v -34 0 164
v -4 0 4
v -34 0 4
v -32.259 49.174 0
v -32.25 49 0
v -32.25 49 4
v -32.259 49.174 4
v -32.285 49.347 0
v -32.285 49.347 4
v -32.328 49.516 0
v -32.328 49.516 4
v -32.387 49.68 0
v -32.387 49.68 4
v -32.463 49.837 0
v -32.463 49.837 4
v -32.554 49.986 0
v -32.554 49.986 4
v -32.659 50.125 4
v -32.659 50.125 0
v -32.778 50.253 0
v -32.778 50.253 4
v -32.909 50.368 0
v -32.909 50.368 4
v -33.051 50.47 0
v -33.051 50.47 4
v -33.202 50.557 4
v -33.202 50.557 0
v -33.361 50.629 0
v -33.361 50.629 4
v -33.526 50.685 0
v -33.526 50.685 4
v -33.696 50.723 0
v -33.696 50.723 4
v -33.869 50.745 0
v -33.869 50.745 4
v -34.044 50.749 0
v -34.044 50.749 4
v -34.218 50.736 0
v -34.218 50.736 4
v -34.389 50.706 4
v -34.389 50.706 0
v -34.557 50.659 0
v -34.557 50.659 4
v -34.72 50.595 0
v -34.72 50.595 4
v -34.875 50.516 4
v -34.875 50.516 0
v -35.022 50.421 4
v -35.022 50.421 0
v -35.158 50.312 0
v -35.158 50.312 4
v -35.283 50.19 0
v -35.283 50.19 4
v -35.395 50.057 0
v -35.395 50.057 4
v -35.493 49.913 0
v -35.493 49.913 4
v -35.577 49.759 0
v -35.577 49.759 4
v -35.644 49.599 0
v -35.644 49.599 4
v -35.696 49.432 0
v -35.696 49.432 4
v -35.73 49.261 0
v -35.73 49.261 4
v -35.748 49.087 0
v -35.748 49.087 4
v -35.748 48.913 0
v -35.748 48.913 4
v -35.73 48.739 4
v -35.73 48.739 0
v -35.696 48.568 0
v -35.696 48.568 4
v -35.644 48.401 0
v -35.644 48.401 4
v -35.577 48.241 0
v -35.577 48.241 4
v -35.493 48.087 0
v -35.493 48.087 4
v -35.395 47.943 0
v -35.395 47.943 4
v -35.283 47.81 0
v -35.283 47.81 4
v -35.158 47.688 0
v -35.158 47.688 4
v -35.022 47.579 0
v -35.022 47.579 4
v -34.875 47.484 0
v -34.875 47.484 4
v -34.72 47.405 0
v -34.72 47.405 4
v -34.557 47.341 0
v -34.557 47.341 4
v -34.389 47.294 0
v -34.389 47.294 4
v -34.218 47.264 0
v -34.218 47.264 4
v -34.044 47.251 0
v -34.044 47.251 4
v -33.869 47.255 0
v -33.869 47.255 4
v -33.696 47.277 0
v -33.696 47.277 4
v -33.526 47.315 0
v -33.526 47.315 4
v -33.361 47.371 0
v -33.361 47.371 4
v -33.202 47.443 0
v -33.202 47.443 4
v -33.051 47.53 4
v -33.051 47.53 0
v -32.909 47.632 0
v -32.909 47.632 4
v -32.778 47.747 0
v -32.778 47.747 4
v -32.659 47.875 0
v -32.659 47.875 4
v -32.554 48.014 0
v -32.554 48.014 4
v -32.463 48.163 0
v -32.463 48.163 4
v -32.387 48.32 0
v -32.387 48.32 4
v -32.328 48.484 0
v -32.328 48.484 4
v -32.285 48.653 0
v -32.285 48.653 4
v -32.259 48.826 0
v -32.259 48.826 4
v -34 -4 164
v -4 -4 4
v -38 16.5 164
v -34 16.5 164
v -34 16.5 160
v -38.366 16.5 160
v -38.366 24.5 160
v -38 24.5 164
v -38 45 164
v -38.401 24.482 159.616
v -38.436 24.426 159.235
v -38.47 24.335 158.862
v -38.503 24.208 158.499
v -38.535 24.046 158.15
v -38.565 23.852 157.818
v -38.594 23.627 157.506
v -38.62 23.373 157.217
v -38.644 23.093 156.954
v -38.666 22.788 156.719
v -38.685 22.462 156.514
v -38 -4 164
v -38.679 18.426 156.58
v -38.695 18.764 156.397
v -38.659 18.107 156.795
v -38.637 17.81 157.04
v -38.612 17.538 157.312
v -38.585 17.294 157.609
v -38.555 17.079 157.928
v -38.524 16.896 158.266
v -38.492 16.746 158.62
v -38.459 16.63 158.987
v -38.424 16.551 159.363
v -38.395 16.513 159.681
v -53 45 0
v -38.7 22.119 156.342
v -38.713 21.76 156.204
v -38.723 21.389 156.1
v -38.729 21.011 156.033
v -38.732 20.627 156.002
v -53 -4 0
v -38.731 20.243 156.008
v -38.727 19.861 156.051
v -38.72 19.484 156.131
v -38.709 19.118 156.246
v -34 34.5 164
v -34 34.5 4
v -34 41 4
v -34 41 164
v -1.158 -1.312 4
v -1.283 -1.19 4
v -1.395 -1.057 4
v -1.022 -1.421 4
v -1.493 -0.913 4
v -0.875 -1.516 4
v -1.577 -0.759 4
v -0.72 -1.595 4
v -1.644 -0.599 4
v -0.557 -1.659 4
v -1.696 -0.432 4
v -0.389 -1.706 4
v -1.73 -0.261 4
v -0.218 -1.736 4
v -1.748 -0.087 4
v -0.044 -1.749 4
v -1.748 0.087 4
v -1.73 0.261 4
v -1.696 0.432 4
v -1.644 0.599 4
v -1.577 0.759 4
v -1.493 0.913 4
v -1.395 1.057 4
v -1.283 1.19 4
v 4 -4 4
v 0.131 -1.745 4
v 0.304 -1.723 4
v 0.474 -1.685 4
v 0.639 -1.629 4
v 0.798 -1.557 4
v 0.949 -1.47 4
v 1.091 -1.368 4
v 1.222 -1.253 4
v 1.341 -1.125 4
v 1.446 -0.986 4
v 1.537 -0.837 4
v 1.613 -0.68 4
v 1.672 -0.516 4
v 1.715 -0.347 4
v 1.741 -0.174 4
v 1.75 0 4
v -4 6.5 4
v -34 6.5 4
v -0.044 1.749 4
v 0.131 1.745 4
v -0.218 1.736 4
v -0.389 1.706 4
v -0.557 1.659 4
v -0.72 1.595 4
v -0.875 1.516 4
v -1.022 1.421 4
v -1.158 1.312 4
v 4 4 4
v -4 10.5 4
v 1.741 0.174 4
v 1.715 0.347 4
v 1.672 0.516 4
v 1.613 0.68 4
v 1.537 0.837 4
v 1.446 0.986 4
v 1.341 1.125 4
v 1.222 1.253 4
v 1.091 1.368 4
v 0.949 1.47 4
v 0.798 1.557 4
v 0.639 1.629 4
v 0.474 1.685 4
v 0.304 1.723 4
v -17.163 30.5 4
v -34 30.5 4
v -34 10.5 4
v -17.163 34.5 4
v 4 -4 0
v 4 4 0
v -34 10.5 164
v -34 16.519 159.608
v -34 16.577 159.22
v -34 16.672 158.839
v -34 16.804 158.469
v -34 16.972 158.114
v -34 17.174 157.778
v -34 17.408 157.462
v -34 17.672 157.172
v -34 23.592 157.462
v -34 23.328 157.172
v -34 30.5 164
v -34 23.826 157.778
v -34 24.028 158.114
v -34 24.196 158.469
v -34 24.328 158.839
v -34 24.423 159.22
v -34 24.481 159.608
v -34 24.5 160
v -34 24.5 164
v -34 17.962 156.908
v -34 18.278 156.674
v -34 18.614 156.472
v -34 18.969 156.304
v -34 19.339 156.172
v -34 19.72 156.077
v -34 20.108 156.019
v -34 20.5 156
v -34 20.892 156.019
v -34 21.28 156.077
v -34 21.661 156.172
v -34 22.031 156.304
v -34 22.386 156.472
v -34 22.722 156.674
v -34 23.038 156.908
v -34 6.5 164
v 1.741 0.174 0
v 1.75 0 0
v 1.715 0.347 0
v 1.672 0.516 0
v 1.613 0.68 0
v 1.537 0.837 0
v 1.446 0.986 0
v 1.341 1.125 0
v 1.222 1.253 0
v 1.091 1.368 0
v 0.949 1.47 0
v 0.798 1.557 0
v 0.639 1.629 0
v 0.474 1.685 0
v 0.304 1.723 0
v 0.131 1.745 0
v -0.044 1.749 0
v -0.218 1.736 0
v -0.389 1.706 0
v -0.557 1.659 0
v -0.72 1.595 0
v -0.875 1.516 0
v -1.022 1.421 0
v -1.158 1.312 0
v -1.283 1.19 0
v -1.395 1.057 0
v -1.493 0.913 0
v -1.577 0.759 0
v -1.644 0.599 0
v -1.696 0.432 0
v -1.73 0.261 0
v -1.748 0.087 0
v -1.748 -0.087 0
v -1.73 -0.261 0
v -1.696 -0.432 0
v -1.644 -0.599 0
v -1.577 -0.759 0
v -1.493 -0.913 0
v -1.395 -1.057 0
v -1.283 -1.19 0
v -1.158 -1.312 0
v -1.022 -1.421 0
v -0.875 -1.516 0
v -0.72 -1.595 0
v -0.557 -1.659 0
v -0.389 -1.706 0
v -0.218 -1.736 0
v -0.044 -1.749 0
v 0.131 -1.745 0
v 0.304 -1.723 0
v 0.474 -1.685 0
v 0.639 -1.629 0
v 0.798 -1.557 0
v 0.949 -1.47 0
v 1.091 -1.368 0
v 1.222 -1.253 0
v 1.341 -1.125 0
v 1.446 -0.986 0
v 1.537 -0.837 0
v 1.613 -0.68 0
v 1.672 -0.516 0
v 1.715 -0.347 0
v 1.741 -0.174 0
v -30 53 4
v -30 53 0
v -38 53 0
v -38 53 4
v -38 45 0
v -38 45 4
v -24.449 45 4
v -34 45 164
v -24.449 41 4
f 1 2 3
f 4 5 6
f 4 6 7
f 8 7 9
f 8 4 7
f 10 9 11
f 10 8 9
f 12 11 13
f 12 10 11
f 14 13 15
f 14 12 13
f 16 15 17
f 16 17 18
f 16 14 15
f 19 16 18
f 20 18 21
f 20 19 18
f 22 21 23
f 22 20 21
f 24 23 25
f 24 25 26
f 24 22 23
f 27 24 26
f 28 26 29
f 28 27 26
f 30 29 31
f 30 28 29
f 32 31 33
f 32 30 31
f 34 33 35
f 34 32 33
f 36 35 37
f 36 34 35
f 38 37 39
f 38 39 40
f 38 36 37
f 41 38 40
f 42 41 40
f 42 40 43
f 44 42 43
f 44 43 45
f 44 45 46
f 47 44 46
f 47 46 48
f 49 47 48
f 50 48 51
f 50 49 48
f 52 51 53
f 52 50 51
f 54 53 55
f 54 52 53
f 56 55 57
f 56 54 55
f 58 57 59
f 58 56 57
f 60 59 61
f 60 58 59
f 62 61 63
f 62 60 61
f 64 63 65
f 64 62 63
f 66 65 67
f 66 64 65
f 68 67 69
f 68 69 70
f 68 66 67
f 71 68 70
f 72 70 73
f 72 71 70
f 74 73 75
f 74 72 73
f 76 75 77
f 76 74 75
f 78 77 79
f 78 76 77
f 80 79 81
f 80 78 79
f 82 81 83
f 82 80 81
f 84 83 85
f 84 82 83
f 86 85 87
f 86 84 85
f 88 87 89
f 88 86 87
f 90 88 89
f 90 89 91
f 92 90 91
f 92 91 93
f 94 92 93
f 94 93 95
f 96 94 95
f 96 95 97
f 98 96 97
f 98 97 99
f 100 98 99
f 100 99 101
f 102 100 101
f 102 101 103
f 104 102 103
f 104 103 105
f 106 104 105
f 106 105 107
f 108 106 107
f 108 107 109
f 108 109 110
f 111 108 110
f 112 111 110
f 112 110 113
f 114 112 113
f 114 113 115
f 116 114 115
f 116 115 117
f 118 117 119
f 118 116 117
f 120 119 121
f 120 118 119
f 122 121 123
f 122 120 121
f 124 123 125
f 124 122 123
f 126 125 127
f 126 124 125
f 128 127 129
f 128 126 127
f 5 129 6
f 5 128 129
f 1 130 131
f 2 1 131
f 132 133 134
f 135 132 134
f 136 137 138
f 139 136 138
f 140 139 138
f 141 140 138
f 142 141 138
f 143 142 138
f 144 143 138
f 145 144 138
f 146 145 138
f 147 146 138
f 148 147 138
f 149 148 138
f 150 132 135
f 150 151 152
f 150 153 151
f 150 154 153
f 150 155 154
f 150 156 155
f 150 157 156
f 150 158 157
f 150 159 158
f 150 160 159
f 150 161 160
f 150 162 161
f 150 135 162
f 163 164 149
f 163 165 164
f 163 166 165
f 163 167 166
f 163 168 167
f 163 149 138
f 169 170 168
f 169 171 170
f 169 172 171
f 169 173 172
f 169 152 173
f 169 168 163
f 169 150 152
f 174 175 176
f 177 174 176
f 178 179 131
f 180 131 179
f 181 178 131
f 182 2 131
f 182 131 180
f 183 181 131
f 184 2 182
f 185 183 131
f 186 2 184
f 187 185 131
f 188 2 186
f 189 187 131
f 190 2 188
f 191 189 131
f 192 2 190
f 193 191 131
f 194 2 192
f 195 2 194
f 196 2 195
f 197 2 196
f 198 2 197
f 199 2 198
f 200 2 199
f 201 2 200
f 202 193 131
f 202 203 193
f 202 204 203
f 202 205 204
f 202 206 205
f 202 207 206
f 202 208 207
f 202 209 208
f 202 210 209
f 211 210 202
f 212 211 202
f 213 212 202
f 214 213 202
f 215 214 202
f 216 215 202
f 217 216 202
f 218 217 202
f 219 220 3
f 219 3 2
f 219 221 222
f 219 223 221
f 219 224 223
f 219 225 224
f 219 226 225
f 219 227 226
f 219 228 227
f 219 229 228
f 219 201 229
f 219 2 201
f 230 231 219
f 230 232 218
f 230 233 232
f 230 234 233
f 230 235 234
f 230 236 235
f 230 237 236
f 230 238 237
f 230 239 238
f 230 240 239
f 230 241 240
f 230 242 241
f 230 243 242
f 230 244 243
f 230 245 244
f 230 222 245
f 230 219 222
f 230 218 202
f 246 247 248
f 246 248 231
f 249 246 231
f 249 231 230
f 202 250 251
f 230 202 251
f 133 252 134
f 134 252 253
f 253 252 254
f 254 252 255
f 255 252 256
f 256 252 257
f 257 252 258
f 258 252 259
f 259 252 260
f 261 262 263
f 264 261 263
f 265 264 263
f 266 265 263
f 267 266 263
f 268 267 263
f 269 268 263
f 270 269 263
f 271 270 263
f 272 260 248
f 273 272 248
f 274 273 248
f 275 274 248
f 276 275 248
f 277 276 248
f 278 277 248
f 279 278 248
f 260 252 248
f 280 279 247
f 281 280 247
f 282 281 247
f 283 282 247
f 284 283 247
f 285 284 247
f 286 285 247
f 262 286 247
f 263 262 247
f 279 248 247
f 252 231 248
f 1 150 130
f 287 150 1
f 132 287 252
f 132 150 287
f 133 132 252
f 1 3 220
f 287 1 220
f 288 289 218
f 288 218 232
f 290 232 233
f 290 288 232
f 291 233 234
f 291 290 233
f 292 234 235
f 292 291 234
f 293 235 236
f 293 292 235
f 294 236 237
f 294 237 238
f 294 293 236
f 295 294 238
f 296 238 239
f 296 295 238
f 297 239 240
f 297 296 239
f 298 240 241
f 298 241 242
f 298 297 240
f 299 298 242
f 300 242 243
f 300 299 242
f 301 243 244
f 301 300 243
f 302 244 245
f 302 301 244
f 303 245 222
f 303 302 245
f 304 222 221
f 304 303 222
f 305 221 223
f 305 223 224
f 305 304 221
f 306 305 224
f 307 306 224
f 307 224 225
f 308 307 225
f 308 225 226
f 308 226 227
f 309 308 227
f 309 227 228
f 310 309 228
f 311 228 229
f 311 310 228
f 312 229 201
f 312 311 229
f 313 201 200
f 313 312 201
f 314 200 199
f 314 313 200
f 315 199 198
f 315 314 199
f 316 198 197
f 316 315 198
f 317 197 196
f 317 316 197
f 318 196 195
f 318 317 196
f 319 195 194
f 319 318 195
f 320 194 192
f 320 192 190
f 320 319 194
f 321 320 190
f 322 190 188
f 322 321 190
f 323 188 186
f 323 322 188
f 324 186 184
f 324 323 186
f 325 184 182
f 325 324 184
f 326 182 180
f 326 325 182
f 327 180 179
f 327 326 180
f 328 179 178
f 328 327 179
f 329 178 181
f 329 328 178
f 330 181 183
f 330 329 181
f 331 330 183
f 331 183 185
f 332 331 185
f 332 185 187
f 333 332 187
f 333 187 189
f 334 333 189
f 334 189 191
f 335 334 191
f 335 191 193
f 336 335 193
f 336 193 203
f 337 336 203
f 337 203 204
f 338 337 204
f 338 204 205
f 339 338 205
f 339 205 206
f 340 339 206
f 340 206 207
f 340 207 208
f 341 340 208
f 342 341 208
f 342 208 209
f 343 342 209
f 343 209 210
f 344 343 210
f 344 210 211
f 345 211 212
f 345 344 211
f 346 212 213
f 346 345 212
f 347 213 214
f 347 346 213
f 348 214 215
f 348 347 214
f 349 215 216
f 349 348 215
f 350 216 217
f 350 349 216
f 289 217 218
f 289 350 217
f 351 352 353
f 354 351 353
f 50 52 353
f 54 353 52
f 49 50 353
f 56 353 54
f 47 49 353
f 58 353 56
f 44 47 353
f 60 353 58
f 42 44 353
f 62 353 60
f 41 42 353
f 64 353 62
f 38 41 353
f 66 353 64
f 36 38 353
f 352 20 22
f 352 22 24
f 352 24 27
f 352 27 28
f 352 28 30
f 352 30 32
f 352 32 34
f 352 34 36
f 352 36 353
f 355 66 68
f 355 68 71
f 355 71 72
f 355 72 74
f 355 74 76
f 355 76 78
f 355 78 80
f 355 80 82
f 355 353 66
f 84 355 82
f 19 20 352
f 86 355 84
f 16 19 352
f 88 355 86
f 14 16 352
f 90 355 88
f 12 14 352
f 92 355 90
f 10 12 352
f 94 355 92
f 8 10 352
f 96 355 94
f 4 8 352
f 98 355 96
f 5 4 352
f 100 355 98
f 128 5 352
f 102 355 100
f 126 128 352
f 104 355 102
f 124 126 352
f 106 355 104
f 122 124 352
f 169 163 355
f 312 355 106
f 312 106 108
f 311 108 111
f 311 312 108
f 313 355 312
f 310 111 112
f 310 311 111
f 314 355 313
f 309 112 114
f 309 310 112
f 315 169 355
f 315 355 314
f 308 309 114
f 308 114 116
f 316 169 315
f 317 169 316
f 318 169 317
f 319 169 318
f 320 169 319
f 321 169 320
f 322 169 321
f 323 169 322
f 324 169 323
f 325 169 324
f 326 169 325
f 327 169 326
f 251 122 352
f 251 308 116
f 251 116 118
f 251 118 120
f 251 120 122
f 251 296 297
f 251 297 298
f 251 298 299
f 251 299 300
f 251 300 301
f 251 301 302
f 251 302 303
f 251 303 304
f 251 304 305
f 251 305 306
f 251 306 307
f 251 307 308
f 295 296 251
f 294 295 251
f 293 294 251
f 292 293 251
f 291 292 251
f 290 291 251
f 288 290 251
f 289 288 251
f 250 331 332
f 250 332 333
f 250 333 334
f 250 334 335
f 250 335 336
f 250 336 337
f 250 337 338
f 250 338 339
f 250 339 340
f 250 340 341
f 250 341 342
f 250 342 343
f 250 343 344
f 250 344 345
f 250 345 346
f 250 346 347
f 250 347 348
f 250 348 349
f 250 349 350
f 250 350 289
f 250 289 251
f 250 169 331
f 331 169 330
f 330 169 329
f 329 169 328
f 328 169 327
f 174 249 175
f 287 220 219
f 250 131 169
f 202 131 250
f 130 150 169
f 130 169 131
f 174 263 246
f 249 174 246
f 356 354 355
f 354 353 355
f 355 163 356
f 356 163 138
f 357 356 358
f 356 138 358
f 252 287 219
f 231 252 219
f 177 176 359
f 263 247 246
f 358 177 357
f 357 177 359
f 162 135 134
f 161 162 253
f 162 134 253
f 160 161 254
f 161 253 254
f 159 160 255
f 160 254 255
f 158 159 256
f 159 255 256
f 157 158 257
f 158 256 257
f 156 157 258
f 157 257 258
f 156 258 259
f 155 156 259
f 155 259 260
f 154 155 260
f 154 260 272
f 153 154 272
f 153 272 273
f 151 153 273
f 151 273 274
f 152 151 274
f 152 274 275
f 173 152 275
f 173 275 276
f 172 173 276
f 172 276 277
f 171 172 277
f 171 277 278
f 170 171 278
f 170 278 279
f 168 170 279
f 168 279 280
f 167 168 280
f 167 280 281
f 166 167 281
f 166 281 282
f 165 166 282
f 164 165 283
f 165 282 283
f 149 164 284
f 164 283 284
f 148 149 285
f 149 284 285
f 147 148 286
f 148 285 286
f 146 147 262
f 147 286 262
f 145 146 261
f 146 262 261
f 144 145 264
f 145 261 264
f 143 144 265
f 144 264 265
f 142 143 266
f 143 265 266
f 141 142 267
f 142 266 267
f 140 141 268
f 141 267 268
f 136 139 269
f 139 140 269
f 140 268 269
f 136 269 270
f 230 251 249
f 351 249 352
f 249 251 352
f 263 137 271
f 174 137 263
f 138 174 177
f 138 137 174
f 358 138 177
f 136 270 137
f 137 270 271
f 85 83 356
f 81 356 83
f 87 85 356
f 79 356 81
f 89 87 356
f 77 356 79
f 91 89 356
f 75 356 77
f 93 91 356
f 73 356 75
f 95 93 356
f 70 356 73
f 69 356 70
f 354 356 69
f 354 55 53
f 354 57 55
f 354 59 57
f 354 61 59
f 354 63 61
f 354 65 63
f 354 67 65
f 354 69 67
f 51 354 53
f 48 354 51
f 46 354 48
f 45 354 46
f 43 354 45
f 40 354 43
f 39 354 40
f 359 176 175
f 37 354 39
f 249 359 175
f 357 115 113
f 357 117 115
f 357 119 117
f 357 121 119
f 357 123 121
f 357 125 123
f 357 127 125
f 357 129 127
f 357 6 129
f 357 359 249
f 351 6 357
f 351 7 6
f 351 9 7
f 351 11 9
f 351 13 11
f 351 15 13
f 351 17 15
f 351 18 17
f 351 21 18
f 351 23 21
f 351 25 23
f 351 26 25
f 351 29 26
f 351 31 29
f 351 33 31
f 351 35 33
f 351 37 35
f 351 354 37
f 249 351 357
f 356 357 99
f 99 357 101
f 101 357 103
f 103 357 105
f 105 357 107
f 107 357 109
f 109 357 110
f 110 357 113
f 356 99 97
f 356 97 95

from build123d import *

# Parameters (mm, degrees)
F0_R      = 1.75
F1_DEPTH  = 4
F3_DEPTH  = 160
F5_DEPTH  = 49
F7_DEPTH  = 19.001
F9_DEPTH  = 14.5
F11_DEPTH = 4
F13_DEPTH = 4


with BuildPart() as f1:
    # F0 (on Top) → F1 (new body)
    with BuildSketch(Plane.XY):
        Polygon((-38, -4), (4, -4), (4, 4), (-30, 53), (-38, 53), align=None)
        Circle(F0_R, mode=Mode.SUBTRACT)
        with Locations((-34, 49)):
            Circle(F0_R, mode=Mode.SUBTRACT)
    extrude(amount=F1_DEPTH)

    # F2 (on face) → F3 (join)
    with BuildSketch(Plane.XY.offset(4)):
        Polygon((-24.44898, 45), (-38, 45), (-38, -4), (-4, -4), (-4, 0), (-34, 0), (-34, 6.5), (-4, 6.5), (-4, 10.5), (-34, 10.5), (-34, 30.5), (-17.163265, 30.5), (-17.163265, 34.5), (-34, 34.5), (-34, 41), (-24.44898, 41), align=None)
    extrude(amount=F3_DEPTH)

    # F4 (on face) → F5 (join, through all)
    with BuildSketch(Plane.XZ.offset(4)):
        Polygon((-53, 0), (-38, 0), (-38, 164), align=None)
    extrude(amount=-F5_DEPTH)

    # F6 (on face) → F7 (cut, through all)
    with BuildSketch(Plane.YZ.offset(-34)):
        with BuildLine():
            Line((16.5, 164), (16.5, 160))
            ThreePointArc((16.5, 160), (20.5, 156), (24.5, 160))
            Line((24.5, 160), (24.5, 164))
            ThreePointArc((24.5, 164), (20.5, 168), (16.5, 164))
        make_face()
    extrude(amount=-F7_DEPTH, mode=Mode.SUBTRACT)

    # F8 (on face) → F9 (cut, through all)
    with BuildSketch(Plane.XZ.offset(4)):
        Polygon((-34, 164), (-4, 4), (-4, 164), align=None)
    extrude(amount=-F9_DEPTH, mode=Mode.SUBTRACT)

    # F10 (on face) → F11 (cut, through all)
    with BuildSketch(Plane.XZ.offset(-30.5)):
        Polygon((-17.163265, 164), (-34, 164), (-17.163265, 4), align=None)
    extrude(amount=-F11_DEPTH, mode=Mode.SUBTRACT)

    # F12 (on face) → F13 (cut, through all)
    with BuildSketch(Plane.XZ.offset(-41)):
        Polygon((-34, 164), (-24.44898, 4), (-24.44898, 164), align=None)
    extrude(amount=-F13_DEPTH, mode=Mode.SUBTRACT)


solid = f1.part
